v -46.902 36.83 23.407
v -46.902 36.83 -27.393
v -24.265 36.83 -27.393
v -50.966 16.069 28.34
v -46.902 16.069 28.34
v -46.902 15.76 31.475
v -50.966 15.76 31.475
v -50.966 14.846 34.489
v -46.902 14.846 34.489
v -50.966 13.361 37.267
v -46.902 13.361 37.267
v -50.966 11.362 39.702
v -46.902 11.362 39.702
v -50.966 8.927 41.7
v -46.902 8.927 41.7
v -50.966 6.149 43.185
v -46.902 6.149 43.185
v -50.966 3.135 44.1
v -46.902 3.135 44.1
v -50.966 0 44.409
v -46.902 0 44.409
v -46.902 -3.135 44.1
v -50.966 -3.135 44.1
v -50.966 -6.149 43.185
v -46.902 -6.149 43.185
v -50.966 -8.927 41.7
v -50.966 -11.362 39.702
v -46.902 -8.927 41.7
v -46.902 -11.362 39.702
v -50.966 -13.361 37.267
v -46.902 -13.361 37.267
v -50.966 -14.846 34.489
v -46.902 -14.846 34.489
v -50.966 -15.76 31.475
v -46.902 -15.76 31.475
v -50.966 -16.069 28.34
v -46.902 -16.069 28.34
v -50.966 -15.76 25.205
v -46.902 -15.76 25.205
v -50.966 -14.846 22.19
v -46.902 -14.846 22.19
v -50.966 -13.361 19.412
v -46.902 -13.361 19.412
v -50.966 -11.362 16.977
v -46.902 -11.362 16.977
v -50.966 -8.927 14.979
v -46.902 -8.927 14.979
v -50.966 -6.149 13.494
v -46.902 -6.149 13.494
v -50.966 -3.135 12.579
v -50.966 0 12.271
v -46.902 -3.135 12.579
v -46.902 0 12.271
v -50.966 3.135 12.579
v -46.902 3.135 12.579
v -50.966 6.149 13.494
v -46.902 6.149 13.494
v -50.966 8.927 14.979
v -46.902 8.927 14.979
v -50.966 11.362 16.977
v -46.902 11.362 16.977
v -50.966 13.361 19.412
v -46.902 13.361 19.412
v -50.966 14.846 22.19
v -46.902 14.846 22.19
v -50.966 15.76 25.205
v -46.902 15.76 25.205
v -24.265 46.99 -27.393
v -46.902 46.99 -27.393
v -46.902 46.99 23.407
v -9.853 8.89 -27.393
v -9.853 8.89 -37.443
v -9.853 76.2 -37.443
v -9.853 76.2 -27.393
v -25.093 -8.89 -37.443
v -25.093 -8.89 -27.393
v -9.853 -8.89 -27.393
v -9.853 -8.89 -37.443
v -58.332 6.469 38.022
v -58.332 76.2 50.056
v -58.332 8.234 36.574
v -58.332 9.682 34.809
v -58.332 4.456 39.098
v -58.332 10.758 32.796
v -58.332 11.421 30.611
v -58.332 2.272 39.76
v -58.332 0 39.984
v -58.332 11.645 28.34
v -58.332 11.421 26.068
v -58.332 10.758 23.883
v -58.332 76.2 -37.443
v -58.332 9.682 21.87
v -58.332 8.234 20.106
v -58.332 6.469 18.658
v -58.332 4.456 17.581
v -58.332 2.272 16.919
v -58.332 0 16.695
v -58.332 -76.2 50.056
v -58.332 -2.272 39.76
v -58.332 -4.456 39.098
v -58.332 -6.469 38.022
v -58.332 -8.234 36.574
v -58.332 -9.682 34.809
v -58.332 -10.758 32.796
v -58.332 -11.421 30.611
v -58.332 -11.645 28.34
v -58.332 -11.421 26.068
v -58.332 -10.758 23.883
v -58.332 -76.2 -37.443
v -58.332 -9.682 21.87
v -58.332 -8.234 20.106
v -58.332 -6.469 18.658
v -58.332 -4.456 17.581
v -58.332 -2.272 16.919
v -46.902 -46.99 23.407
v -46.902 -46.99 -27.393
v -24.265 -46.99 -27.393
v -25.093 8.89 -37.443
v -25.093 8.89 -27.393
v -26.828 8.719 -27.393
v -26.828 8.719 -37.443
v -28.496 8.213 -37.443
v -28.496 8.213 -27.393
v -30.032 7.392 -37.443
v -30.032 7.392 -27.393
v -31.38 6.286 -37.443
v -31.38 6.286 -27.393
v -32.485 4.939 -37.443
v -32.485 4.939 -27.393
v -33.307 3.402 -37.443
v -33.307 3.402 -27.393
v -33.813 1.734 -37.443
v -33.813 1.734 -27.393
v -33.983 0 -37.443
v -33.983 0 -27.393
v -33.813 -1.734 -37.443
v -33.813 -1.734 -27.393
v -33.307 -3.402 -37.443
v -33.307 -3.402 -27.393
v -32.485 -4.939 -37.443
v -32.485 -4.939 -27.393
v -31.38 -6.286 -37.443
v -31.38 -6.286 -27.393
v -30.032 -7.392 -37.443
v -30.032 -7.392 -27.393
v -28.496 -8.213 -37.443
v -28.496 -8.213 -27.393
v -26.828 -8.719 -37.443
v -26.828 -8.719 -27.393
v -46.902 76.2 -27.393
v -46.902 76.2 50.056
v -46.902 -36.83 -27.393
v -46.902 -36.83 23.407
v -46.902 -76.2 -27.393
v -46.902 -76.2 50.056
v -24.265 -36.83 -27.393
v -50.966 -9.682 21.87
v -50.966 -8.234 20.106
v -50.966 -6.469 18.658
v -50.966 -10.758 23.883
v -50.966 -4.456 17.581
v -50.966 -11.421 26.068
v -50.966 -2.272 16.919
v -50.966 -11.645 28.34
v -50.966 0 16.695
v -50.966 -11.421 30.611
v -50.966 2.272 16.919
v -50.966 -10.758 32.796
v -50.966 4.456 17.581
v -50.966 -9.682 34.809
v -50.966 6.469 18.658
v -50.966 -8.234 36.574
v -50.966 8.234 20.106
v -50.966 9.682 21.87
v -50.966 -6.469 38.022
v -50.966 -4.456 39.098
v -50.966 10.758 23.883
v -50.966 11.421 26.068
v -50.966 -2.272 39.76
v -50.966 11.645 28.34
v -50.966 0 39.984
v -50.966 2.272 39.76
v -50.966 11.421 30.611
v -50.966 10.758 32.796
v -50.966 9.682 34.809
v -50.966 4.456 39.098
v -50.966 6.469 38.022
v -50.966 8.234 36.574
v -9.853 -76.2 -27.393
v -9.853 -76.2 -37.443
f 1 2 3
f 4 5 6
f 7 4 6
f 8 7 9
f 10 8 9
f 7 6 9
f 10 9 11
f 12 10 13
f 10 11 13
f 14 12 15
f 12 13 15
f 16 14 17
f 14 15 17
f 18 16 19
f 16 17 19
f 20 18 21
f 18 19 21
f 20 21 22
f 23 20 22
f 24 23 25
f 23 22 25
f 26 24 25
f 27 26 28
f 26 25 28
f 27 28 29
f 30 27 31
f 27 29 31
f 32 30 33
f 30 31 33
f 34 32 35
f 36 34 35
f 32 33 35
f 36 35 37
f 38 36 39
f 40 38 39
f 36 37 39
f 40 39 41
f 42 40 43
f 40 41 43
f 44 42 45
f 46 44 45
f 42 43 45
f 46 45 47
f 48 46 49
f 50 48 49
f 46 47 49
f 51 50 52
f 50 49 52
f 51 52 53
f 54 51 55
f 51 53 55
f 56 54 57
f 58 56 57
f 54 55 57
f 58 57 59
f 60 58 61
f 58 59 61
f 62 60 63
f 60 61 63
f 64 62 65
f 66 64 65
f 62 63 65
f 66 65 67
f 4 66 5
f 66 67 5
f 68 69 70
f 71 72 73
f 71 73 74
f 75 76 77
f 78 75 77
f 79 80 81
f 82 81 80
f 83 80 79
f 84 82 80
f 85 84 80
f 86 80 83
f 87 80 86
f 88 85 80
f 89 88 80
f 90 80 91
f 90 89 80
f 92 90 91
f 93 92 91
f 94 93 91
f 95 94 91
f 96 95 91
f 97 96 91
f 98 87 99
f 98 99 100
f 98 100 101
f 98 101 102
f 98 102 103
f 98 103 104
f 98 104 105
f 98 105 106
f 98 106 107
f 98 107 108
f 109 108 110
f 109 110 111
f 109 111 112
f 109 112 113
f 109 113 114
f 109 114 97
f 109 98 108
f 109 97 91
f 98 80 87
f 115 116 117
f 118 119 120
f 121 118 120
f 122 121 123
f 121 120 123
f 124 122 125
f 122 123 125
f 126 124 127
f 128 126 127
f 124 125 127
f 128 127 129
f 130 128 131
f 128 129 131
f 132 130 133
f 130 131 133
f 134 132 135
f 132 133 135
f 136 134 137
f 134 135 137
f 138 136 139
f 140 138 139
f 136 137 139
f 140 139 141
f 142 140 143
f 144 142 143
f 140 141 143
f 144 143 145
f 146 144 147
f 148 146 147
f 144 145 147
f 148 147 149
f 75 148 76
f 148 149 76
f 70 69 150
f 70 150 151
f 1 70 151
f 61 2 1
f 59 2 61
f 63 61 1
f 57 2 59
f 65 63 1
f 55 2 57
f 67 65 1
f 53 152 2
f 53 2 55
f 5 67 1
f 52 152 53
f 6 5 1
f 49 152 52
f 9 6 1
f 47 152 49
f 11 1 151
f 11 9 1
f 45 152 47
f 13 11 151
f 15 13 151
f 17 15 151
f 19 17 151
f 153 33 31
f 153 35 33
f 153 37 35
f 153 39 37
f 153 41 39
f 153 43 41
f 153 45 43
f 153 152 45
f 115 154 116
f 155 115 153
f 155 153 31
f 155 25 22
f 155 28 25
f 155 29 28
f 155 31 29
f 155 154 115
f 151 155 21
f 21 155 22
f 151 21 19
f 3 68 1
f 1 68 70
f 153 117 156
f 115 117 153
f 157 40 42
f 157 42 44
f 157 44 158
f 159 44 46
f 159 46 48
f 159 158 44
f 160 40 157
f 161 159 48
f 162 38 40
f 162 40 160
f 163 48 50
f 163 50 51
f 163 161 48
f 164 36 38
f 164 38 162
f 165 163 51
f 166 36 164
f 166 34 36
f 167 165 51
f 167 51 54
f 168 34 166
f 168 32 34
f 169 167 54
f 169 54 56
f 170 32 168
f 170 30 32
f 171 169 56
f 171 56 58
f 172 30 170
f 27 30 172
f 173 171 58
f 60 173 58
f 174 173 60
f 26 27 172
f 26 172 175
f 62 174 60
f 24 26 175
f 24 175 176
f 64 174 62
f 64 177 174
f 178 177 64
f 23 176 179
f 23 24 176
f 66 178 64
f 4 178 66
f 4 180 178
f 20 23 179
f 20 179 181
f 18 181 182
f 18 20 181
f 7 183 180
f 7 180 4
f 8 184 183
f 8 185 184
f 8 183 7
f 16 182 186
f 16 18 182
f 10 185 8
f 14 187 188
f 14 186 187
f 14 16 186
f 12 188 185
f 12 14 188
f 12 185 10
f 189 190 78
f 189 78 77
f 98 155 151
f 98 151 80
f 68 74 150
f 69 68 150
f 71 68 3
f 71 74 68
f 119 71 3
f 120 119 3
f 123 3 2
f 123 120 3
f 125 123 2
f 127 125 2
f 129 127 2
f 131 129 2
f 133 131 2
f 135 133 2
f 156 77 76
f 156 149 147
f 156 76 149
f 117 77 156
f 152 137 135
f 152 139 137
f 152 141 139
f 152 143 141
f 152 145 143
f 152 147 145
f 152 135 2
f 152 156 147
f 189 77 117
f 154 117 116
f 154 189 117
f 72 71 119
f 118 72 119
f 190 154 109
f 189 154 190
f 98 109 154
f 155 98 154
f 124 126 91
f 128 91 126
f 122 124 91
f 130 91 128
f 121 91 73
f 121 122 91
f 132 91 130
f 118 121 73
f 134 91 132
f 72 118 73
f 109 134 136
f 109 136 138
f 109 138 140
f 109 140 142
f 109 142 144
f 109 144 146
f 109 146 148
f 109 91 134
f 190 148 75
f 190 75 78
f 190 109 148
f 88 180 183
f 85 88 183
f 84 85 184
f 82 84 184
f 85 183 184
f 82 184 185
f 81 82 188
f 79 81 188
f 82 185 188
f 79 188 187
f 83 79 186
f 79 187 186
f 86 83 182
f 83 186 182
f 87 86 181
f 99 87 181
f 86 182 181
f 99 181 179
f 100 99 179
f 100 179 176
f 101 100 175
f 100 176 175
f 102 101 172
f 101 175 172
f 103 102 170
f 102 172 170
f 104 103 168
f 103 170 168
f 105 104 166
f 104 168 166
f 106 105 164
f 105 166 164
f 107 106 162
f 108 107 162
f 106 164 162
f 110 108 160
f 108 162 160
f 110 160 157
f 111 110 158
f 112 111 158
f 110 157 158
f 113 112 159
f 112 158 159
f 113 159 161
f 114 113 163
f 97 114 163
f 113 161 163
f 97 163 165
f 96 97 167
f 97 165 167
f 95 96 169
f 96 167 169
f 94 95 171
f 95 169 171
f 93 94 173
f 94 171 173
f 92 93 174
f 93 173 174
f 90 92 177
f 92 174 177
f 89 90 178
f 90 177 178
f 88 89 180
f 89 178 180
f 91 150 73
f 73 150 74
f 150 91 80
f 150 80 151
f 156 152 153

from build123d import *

# Parameters (mm, degrees)
F1_DEPTH  = 76.2
F2_R      = 11.6445519737
F3_DEPTH  = 12.7
F4_R      = 16.0689830222
F4_R_2    = 11.6445519737
F5_DEPTH  = 4.064
F7_DEPTH  = 10.0515203009
F10_DEPTH = 10.16


# Not quite as in the source:
# - a pattern or mirror of a feature is missing from the dataset's text; its kind, count and spacing are read off the source's solid


with BuildPart() as f1:
    # F0 (on Front) → F1 (new body, symmetric)
    with BuildSketch(Plane.XZ):
        Polygon((-46.9024144113, -27.3925848305), (-46.9024144113, 50.0555187464), (-58.332413435, 50.0555187464), (-58.332413435, -37.4431051314), (-9.8534487188, -37.4431051314), (-9.8534487188, -27.3925848305), align=None)
    extrude(amount=F1_DEPTH, both=True)

    # F2 (on face) → F3 (cut, symmetric)
    with BuildSketch(Plane.YZ.offset(-46.9024144113)):
        with Locations((0, 28.3396150917)):
            Circle(F2_R)
    extrude(amount=F3_DEPTH, both=True, mode=Mode.SUBTRACT)

    # F4 (on face) → F5 (cut)
    with BuildSketch(Plane.YZ.offset(-46.9024144113)):
        with Locations((0, 28.3396150917)):
            Circle(F4_R)
        with Locations((0, 28.3396150917)):
            Circle(F4_R_2, mode=Mode.SUBTRACT)
    extrude(amount=-F5_DEPTH, mode=Mode.SUBTRACT)

    # F6 (on face) → F7 (cut, through all)
    with BuildSketch(Plane.XY.offset(-27.3925848305)):
        with BuildLine():
            ThreePointArc((-25.0934487188, -8.89), (-18.807269434, -6.2861792847), (-16.2034487188, 0))
            ThreePointArc((-16.2034487188, 0), (-18.807269434, 6.2861792847), (-25.0934487188, 8.89))
            ThreePointArc((-25.0934487188, 8.89), (-33.9834487188, 0), (-25.0934487188, -8.89))
        make_face()
        with BuildLine():
            ThreePointArc((-25.0934487188, 8.89), (-18.807269434, 6.2861792847), (-16.2034487188, 0))
            ThreePointArc((-16.2034487188, 0), (-18.807269434, -6.2861792847), (-25.0934487188, -8.89))
            Line((-25.0934487188, -8.89), (-9.8534487188, -8.89))
            Line((-9.8534487188, -8.89), (-9.8534487188, 8.89))
            Line((-9.8534487188, 8.89), (-25.0934487188, 8.89))
        make_face()
    extrude(amount=-F7_DEPTH, mode=Mode.SUBTRACT)

    # F9 (on offset) → F10 (join)
    with BuildSketch(Plane.XZ.offset(-46.99)):
        Polygon((-24.2647007108, -27.3925848305), (-46.9024144113, 23.4074151695), (-46.9024144113, -27.3925848305), align=None)
    f10 = extrude(amount=F10_DEPTH)

    # F10_copies: F10 across plane
    add(f10.mirror(Plane(origin=(0, 0, 0), x_dir=(0, 0, -1), z_dir=(0, -1, 0))))


solid = f1.part
